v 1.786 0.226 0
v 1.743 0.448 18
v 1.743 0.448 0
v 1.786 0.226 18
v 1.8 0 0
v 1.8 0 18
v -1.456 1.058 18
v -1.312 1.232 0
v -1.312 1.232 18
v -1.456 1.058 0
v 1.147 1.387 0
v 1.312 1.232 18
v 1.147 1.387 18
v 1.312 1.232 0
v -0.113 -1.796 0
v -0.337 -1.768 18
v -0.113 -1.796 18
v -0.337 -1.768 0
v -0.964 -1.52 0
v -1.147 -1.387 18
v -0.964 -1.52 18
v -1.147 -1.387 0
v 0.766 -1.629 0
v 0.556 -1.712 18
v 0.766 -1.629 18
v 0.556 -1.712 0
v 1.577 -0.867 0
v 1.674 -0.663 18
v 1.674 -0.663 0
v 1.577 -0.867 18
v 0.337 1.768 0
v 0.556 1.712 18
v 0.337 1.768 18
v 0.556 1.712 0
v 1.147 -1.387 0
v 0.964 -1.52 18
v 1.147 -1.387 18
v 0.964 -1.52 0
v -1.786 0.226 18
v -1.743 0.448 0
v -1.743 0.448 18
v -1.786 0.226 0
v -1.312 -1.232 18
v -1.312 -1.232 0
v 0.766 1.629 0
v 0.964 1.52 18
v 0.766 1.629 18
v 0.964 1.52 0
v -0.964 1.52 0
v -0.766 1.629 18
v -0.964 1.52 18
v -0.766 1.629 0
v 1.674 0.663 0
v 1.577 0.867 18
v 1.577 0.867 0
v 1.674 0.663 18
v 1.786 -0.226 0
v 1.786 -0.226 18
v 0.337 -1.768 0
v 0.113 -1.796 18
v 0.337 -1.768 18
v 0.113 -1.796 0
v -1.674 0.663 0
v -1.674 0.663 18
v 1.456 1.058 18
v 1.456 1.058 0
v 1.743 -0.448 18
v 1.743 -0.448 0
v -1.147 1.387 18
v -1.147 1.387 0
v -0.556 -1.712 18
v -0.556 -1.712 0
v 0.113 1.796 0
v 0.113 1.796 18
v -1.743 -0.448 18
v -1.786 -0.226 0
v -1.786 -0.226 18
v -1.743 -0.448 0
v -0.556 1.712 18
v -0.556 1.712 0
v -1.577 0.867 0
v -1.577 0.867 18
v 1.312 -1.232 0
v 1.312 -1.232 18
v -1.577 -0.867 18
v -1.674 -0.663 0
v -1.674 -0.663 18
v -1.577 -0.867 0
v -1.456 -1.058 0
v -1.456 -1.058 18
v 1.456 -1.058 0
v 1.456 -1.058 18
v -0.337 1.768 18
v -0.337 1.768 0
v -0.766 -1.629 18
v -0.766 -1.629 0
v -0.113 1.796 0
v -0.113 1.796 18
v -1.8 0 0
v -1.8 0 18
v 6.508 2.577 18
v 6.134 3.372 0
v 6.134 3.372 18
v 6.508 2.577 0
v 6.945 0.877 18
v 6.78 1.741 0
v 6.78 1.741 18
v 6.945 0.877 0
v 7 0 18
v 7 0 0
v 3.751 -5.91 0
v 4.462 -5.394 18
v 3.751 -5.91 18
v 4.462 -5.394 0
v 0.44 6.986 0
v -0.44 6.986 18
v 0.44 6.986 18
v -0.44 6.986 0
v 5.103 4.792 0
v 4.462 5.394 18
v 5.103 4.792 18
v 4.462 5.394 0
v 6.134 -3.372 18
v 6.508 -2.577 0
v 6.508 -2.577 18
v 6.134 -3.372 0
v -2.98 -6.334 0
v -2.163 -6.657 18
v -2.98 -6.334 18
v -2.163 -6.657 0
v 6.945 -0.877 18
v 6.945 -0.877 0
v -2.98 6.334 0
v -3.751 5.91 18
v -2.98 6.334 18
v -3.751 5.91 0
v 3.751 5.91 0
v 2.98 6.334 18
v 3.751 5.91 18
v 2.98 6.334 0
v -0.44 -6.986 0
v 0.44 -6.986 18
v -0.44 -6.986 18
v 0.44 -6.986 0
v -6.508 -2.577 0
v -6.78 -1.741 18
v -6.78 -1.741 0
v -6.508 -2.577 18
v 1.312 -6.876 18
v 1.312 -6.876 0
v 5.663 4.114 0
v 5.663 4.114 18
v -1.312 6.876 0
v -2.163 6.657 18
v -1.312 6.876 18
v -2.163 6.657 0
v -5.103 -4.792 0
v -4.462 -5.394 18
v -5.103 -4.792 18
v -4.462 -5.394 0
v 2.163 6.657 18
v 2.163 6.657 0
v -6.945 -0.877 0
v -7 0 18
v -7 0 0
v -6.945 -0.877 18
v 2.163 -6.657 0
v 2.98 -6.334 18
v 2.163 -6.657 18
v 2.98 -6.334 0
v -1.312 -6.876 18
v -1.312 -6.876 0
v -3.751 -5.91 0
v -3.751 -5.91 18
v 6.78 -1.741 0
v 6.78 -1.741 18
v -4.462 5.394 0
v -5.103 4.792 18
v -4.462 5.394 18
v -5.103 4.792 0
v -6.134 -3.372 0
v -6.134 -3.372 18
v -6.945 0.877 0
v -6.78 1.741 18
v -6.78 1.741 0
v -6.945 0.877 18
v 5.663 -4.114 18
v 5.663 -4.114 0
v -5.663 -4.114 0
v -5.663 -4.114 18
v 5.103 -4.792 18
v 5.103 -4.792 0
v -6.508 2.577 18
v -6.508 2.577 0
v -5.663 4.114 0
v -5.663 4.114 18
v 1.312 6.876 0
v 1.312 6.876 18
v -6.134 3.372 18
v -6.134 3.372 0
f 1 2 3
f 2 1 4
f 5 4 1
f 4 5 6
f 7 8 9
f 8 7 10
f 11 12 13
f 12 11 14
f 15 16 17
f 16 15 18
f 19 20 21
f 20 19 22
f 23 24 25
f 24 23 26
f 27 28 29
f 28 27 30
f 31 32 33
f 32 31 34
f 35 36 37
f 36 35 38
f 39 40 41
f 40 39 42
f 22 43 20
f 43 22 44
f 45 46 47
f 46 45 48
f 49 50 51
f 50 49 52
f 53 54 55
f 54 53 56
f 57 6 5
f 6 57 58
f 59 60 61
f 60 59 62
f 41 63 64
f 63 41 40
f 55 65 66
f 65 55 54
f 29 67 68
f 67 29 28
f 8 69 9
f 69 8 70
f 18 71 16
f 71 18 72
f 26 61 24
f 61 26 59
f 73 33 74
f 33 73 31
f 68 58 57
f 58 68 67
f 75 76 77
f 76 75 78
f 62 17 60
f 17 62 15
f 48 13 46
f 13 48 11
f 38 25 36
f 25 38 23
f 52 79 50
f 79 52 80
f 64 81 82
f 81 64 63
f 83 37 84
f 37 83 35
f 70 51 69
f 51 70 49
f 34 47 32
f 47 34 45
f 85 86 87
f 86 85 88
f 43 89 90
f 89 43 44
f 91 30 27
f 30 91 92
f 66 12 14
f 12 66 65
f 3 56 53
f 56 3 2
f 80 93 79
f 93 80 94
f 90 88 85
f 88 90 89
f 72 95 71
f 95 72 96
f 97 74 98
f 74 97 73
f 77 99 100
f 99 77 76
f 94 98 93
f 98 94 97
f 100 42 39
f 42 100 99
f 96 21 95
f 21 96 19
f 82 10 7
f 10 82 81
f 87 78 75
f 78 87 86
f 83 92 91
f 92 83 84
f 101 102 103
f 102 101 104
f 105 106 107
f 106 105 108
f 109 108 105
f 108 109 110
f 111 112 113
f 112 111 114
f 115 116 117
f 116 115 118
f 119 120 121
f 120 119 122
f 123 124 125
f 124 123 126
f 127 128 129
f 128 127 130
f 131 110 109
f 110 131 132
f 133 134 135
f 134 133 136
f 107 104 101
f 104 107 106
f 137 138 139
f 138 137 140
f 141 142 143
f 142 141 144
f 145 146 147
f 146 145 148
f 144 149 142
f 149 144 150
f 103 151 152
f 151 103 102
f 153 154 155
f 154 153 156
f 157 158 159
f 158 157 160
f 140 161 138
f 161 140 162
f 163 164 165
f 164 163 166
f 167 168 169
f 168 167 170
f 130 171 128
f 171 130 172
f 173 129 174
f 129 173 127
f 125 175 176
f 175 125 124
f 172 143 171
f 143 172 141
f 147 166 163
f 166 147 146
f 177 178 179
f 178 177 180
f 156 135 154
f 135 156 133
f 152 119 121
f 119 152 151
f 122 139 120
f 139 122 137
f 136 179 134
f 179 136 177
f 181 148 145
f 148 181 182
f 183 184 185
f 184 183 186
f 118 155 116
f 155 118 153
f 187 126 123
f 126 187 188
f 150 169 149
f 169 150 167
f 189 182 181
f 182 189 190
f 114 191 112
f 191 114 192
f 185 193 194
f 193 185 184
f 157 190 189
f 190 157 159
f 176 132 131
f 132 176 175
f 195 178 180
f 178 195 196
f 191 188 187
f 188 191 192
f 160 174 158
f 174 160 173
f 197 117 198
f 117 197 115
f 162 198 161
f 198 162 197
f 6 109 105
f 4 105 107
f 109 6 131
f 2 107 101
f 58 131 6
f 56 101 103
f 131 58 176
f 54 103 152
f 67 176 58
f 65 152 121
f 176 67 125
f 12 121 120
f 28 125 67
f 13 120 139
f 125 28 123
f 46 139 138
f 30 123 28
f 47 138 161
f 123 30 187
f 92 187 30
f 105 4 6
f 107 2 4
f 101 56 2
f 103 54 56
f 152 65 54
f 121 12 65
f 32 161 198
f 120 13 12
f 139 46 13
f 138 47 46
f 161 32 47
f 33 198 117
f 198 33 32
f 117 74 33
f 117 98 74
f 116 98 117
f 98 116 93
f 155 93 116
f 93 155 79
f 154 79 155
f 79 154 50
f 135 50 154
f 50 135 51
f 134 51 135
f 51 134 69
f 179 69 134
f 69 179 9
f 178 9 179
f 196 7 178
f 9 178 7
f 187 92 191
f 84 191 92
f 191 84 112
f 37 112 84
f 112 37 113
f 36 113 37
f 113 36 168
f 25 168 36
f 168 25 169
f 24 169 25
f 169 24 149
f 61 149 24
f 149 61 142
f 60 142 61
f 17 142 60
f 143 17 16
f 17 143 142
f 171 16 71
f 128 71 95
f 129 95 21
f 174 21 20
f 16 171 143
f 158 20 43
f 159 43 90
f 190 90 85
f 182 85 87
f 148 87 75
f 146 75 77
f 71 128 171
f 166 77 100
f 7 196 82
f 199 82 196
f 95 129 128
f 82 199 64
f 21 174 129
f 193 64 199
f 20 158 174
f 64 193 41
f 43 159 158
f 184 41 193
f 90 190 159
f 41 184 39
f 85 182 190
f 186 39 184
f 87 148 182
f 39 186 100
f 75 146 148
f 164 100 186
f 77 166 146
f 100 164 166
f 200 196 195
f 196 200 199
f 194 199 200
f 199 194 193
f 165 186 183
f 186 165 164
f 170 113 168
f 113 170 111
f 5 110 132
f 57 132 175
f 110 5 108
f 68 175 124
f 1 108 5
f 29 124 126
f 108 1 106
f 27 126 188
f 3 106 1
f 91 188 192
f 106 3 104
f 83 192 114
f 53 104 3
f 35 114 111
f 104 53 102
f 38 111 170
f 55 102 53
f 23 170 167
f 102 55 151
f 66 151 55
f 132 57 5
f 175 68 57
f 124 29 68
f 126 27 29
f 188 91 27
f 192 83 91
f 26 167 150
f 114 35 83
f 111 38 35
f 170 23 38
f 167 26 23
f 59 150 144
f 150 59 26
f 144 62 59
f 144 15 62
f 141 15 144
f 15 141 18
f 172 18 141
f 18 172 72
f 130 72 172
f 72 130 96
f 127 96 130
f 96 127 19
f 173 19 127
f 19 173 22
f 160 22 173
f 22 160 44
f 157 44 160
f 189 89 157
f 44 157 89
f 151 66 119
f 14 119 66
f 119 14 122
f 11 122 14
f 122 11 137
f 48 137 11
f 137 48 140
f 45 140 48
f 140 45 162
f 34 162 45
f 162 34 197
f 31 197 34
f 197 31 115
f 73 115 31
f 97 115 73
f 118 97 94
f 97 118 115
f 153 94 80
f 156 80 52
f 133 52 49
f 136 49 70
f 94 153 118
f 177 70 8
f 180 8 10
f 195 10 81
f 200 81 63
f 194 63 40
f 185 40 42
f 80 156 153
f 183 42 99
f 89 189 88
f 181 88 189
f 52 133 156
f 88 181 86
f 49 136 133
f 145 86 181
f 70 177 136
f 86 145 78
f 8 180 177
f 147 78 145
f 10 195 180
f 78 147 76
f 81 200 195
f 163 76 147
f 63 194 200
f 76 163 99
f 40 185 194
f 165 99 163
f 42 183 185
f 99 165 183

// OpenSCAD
$fn = 50;


difference() {
	union() {
		cylinder(h = 18, r = 7.0000000000);
	}
	union() {
		translate(v = [0.0000000000, 0.0000000000, -100.0000000000]) {
			cylinder(h = 200, r = 1.8000000000);
		}
		cylinder(h = 18, r = 1.8000000000);
		cylinder(h = 18, r = 1.8000000000);
		cylinder(h = 18, r = 1.8000000000);
	}
}
